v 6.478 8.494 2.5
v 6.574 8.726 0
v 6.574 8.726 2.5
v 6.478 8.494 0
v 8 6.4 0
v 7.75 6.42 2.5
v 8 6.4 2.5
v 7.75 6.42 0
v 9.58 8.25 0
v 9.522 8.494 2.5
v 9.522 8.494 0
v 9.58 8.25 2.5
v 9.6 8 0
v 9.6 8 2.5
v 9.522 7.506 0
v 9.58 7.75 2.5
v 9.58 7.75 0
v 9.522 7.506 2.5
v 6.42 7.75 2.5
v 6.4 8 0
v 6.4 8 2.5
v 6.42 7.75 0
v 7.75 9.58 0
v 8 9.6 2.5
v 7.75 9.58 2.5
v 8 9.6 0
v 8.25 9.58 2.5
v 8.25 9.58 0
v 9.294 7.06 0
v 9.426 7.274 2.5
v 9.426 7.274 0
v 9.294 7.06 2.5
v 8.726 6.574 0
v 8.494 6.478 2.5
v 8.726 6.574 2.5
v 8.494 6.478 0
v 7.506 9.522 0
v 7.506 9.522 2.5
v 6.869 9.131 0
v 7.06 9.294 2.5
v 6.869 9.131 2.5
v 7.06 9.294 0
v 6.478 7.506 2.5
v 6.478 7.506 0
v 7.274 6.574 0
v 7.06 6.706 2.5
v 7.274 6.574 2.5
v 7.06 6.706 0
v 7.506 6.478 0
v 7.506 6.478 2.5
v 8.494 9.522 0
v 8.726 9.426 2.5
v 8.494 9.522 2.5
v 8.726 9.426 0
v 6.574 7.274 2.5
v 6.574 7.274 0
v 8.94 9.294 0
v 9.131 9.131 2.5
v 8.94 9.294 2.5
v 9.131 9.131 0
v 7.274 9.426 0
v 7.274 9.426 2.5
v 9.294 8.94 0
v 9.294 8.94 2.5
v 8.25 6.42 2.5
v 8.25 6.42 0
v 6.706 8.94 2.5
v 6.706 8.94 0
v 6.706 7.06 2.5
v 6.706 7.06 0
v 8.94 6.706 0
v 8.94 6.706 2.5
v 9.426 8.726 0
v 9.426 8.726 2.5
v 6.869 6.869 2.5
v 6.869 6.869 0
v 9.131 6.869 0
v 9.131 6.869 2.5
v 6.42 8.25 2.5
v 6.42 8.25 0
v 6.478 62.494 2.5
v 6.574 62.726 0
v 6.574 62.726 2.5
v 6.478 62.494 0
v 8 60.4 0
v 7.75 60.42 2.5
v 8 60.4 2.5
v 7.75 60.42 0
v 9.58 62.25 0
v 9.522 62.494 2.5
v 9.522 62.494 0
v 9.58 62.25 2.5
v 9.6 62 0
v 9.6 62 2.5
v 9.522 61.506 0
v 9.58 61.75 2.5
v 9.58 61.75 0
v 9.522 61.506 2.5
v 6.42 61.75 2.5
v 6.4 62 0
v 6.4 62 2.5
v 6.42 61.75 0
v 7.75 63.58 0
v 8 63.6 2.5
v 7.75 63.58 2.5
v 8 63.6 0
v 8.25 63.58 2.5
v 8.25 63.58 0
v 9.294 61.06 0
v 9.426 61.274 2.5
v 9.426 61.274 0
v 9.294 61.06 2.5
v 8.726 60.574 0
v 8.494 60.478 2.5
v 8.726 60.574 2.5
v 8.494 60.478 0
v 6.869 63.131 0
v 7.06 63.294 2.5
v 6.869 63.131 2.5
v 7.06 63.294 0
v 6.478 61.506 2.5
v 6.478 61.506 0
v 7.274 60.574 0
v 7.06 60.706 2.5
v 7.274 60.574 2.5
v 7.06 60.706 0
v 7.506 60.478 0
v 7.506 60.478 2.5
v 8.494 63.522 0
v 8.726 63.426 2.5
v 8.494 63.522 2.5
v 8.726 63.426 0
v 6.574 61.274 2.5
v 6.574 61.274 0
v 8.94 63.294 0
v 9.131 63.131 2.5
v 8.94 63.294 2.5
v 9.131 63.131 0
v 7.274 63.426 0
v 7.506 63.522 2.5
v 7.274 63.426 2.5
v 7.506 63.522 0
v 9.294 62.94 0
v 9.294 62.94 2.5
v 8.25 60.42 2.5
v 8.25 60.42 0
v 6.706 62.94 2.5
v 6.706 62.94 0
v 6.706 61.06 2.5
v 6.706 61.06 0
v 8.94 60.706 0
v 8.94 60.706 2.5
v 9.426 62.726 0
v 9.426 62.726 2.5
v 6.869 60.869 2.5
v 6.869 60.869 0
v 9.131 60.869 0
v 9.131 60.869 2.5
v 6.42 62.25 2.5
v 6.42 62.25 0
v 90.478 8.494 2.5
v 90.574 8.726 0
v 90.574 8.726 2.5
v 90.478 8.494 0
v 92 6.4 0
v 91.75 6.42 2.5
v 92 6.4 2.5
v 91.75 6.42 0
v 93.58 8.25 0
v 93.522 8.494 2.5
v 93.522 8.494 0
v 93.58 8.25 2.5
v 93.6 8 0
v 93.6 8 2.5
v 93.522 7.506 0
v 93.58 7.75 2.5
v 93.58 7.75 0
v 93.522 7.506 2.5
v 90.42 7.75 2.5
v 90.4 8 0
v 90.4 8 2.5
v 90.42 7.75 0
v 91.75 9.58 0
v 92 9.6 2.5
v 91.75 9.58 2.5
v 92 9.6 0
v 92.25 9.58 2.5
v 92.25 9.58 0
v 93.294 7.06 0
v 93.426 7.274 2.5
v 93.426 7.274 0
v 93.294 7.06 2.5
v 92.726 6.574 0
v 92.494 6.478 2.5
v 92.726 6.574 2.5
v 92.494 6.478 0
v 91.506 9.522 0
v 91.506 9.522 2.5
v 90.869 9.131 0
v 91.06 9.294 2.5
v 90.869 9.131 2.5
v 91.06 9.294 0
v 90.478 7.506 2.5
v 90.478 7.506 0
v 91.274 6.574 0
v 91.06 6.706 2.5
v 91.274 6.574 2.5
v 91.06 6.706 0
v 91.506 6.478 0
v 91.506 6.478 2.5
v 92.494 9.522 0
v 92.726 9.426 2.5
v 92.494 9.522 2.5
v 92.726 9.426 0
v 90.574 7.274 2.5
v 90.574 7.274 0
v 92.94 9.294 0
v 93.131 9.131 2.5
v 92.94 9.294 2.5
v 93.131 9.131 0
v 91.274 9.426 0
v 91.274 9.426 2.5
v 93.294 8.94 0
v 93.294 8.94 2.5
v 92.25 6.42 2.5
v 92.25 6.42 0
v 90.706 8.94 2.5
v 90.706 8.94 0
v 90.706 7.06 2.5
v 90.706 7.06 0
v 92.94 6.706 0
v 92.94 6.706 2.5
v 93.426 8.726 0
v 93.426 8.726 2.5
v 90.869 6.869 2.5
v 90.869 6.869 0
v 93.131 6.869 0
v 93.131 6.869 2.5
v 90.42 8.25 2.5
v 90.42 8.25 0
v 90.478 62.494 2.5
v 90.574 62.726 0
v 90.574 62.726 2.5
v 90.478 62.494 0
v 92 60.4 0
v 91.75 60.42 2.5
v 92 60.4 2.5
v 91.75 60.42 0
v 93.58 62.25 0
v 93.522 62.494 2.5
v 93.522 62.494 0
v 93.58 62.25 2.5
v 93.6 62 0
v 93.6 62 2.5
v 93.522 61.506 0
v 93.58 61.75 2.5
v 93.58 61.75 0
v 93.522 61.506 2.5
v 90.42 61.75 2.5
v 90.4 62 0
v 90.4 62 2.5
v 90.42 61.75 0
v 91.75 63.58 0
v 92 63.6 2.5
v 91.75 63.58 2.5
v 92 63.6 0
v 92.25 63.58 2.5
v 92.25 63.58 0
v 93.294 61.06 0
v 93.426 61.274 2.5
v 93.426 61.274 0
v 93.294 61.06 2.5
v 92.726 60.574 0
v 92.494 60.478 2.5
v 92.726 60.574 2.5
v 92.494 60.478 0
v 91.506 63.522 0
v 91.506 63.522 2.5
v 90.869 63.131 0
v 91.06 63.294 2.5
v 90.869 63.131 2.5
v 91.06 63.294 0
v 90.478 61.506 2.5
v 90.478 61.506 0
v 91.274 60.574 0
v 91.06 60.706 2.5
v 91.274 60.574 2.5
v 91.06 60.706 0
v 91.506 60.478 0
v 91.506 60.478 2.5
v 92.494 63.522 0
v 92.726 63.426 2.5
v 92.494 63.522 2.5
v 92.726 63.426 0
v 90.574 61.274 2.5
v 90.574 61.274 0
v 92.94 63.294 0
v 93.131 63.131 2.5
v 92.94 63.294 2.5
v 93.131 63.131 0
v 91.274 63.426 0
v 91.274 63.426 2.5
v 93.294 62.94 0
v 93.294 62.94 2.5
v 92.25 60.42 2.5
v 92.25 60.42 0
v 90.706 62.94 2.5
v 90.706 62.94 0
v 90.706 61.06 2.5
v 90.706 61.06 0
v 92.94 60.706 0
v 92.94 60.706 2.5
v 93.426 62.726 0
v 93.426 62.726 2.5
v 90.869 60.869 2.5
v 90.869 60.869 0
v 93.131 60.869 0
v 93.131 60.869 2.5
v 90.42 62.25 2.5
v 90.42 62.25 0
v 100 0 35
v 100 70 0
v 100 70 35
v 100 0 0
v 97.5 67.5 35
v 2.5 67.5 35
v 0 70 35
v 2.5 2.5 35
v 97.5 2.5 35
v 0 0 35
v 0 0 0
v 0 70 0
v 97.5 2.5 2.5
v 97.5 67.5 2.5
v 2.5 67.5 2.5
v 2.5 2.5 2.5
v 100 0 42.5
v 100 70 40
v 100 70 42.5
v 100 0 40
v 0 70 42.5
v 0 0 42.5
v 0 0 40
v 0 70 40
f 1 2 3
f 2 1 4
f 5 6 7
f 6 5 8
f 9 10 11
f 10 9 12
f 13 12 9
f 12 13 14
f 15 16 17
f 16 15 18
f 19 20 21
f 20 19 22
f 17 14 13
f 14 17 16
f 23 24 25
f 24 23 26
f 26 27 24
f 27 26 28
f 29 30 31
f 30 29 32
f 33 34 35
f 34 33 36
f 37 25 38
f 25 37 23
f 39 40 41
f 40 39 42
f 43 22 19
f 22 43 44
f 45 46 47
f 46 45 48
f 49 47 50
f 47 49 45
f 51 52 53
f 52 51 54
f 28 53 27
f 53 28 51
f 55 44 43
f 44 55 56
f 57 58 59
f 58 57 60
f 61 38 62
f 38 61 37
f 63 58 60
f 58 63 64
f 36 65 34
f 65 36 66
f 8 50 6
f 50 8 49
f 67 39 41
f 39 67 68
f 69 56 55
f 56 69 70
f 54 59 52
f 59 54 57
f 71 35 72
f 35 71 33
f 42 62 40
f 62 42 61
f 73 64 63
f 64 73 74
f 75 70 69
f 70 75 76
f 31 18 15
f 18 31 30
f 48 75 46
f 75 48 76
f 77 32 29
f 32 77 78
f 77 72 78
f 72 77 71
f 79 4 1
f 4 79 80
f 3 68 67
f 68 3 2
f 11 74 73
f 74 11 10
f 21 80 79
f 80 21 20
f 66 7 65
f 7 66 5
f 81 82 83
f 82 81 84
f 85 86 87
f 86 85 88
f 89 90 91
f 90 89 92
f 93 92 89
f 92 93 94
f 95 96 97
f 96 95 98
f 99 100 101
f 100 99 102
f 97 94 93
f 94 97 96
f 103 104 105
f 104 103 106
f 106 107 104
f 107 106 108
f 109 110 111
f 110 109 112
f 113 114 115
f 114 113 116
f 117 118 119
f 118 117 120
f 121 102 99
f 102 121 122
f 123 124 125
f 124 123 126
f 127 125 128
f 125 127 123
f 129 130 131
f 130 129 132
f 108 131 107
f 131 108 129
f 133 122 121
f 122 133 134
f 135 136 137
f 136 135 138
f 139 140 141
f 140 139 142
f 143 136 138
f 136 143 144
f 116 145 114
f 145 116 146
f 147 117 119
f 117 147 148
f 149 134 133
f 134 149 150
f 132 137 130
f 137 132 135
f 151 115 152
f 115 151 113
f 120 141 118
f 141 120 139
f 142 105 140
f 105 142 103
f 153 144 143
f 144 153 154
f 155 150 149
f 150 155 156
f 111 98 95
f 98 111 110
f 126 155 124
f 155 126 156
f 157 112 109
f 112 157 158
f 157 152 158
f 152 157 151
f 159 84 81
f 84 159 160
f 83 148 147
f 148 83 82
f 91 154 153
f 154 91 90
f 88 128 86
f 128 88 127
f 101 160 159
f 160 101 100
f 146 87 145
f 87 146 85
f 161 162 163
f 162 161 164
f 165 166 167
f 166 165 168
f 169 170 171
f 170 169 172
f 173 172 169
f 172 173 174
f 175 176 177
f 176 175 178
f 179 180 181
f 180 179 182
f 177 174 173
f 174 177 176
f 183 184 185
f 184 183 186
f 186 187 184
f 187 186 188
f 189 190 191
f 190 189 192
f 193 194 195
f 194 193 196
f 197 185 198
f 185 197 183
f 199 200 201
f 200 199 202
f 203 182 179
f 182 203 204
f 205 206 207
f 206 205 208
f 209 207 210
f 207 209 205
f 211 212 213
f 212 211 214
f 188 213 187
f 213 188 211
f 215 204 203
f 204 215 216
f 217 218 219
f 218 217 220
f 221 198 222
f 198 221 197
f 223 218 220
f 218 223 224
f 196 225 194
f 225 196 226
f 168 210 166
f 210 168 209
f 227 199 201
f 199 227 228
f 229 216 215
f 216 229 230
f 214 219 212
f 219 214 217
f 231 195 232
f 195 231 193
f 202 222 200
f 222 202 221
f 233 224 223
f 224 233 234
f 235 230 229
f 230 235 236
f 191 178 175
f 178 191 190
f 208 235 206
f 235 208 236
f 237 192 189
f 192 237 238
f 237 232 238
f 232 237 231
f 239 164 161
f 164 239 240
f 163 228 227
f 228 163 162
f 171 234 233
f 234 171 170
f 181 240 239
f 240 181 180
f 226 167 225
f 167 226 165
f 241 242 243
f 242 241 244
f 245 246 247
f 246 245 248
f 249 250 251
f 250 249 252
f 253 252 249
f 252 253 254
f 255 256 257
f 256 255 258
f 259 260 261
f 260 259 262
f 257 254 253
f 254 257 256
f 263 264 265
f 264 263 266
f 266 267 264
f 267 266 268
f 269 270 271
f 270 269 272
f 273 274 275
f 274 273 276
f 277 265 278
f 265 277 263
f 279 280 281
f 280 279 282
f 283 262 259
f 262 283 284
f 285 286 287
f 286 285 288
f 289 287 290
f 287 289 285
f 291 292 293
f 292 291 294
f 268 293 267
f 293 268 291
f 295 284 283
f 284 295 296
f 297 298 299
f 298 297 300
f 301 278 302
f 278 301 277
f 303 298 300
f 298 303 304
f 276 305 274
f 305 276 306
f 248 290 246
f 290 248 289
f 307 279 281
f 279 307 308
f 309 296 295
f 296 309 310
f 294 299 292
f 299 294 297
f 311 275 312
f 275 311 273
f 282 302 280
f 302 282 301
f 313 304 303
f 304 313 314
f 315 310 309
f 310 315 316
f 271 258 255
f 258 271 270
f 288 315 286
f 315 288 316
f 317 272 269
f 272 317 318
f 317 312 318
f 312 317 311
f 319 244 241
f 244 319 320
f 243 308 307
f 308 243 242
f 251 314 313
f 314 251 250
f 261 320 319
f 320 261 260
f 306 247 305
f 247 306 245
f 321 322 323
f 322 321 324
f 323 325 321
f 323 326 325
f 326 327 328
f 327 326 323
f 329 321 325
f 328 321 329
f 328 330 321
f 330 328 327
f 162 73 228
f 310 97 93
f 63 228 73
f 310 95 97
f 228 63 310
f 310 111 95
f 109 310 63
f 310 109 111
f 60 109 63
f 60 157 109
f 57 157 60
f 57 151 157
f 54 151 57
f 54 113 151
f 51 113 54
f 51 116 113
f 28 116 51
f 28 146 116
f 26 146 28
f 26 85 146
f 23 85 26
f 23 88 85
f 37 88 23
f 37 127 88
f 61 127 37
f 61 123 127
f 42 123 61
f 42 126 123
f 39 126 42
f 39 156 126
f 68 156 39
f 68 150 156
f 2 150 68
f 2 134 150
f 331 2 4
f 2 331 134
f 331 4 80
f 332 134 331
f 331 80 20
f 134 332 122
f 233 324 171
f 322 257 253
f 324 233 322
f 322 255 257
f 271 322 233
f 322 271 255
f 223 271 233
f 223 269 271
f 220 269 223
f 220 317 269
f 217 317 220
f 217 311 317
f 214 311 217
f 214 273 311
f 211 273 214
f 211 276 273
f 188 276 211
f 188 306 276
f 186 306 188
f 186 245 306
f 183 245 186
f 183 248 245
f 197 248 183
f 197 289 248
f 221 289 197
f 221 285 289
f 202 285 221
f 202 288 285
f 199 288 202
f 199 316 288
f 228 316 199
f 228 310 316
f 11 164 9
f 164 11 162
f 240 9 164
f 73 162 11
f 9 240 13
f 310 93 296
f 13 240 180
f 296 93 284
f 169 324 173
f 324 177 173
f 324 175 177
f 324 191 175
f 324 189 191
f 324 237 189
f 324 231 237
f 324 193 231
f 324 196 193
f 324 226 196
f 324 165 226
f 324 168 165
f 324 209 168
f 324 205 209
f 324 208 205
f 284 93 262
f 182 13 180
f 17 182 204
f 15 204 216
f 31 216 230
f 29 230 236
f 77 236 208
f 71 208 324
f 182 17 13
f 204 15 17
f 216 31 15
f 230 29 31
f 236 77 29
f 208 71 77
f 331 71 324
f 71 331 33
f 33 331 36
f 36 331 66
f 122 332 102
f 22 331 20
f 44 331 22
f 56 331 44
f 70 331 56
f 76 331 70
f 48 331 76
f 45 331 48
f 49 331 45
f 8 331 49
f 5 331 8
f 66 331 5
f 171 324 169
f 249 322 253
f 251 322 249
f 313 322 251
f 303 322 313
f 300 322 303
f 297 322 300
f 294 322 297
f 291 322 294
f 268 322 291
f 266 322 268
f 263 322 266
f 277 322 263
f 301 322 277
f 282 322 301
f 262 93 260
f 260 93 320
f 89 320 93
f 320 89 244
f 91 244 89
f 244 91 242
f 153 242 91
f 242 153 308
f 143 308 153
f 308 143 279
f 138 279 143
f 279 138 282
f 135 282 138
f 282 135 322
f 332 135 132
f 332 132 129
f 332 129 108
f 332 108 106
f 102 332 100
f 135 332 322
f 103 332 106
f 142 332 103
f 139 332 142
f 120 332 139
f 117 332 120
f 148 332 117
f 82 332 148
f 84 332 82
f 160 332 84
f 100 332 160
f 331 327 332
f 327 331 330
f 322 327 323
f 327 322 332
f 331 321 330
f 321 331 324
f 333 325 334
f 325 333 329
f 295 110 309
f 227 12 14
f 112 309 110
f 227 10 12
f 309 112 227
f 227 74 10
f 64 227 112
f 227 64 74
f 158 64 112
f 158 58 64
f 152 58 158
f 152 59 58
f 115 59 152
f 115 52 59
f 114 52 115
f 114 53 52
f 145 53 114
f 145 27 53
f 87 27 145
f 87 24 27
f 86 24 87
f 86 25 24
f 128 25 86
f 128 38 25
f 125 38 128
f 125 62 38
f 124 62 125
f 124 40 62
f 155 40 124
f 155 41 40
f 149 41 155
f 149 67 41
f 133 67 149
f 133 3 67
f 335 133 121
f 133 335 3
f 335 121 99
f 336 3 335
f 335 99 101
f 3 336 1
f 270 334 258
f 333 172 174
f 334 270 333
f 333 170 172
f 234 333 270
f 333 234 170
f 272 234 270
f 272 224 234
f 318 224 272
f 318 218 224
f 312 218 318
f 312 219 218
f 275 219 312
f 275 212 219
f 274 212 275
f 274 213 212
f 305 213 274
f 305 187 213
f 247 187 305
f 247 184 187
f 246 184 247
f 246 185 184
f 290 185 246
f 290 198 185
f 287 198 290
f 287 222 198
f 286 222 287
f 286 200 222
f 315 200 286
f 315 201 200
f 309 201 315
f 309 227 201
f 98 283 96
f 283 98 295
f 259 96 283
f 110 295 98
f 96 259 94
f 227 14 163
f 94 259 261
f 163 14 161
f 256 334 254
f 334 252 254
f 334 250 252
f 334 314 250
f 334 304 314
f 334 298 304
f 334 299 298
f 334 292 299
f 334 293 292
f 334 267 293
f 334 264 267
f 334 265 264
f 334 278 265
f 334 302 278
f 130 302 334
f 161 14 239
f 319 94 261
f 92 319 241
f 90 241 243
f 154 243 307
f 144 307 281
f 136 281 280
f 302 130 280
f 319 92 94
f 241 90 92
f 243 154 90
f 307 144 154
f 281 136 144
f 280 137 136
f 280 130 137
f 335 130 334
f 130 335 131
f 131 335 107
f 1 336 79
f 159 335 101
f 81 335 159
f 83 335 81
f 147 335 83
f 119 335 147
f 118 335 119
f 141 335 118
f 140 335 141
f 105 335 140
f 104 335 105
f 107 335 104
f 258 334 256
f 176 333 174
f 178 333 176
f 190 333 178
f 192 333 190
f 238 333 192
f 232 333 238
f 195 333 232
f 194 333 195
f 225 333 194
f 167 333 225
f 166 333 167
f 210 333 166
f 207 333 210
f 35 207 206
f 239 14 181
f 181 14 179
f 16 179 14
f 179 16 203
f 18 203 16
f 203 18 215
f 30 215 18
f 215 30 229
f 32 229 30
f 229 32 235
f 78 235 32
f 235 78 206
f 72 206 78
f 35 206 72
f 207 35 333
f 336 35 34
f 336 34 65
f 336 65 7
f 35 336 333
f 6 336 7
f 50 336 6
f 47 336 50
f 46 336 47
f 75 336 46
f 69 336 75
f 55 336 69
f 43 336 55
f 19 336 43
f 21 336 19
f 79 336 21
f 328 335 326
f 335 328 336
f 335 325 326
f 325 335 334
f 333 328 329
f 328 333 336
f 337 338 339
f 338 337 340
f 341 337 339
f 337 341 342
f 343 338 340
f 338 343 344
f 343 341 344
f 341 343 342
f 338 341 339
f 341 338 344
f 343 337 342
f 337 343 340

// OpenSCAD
// Parametrisches OpenSCAD-Gehaeuse mit Schraubloechern und Lueftungsschlitzen.
// Export in OpenSCAD: F6 rendern, dann File -> Export -> STL.

length = 100;
width = 70;
height = 35;
wall = 2.5;
screw_diameter = 3.2;
screw_offset = 8;
vent_count = 5;
vent_width = 4;
vent_length = 28;

module case_body() {
    difference() {
        cube([length, width, height], center = false);
        translate([wall, wall, wall])
            cube([length - 2 * wall, width - 2 * wall, height], center = false);

        for (x = [screw_offset, length - screw_offset])
            for (y = [screw_offset, width - screw_offset])
                translate([x, y, -1])
                    cylinder(h = height + 2, d = screw_diameter, $fn = 40);

        start_x = (length - ((vent_count - 1) * vent_width * 2.2 + vent_width)) / 2;
        for (i = [0 : vent_count - 1])
            translate([start_x + i * vent_width * 2.2, (width - vent_length) / 2, height - wall - 1])
                cube([vent_width, vent_length, wall + 2], center = false);
    }
}

module optional_lid() {
    translate([0, 0, height + 5])
        cube([length, width, wall], center = false);
}

case_body();
optional_lid();
